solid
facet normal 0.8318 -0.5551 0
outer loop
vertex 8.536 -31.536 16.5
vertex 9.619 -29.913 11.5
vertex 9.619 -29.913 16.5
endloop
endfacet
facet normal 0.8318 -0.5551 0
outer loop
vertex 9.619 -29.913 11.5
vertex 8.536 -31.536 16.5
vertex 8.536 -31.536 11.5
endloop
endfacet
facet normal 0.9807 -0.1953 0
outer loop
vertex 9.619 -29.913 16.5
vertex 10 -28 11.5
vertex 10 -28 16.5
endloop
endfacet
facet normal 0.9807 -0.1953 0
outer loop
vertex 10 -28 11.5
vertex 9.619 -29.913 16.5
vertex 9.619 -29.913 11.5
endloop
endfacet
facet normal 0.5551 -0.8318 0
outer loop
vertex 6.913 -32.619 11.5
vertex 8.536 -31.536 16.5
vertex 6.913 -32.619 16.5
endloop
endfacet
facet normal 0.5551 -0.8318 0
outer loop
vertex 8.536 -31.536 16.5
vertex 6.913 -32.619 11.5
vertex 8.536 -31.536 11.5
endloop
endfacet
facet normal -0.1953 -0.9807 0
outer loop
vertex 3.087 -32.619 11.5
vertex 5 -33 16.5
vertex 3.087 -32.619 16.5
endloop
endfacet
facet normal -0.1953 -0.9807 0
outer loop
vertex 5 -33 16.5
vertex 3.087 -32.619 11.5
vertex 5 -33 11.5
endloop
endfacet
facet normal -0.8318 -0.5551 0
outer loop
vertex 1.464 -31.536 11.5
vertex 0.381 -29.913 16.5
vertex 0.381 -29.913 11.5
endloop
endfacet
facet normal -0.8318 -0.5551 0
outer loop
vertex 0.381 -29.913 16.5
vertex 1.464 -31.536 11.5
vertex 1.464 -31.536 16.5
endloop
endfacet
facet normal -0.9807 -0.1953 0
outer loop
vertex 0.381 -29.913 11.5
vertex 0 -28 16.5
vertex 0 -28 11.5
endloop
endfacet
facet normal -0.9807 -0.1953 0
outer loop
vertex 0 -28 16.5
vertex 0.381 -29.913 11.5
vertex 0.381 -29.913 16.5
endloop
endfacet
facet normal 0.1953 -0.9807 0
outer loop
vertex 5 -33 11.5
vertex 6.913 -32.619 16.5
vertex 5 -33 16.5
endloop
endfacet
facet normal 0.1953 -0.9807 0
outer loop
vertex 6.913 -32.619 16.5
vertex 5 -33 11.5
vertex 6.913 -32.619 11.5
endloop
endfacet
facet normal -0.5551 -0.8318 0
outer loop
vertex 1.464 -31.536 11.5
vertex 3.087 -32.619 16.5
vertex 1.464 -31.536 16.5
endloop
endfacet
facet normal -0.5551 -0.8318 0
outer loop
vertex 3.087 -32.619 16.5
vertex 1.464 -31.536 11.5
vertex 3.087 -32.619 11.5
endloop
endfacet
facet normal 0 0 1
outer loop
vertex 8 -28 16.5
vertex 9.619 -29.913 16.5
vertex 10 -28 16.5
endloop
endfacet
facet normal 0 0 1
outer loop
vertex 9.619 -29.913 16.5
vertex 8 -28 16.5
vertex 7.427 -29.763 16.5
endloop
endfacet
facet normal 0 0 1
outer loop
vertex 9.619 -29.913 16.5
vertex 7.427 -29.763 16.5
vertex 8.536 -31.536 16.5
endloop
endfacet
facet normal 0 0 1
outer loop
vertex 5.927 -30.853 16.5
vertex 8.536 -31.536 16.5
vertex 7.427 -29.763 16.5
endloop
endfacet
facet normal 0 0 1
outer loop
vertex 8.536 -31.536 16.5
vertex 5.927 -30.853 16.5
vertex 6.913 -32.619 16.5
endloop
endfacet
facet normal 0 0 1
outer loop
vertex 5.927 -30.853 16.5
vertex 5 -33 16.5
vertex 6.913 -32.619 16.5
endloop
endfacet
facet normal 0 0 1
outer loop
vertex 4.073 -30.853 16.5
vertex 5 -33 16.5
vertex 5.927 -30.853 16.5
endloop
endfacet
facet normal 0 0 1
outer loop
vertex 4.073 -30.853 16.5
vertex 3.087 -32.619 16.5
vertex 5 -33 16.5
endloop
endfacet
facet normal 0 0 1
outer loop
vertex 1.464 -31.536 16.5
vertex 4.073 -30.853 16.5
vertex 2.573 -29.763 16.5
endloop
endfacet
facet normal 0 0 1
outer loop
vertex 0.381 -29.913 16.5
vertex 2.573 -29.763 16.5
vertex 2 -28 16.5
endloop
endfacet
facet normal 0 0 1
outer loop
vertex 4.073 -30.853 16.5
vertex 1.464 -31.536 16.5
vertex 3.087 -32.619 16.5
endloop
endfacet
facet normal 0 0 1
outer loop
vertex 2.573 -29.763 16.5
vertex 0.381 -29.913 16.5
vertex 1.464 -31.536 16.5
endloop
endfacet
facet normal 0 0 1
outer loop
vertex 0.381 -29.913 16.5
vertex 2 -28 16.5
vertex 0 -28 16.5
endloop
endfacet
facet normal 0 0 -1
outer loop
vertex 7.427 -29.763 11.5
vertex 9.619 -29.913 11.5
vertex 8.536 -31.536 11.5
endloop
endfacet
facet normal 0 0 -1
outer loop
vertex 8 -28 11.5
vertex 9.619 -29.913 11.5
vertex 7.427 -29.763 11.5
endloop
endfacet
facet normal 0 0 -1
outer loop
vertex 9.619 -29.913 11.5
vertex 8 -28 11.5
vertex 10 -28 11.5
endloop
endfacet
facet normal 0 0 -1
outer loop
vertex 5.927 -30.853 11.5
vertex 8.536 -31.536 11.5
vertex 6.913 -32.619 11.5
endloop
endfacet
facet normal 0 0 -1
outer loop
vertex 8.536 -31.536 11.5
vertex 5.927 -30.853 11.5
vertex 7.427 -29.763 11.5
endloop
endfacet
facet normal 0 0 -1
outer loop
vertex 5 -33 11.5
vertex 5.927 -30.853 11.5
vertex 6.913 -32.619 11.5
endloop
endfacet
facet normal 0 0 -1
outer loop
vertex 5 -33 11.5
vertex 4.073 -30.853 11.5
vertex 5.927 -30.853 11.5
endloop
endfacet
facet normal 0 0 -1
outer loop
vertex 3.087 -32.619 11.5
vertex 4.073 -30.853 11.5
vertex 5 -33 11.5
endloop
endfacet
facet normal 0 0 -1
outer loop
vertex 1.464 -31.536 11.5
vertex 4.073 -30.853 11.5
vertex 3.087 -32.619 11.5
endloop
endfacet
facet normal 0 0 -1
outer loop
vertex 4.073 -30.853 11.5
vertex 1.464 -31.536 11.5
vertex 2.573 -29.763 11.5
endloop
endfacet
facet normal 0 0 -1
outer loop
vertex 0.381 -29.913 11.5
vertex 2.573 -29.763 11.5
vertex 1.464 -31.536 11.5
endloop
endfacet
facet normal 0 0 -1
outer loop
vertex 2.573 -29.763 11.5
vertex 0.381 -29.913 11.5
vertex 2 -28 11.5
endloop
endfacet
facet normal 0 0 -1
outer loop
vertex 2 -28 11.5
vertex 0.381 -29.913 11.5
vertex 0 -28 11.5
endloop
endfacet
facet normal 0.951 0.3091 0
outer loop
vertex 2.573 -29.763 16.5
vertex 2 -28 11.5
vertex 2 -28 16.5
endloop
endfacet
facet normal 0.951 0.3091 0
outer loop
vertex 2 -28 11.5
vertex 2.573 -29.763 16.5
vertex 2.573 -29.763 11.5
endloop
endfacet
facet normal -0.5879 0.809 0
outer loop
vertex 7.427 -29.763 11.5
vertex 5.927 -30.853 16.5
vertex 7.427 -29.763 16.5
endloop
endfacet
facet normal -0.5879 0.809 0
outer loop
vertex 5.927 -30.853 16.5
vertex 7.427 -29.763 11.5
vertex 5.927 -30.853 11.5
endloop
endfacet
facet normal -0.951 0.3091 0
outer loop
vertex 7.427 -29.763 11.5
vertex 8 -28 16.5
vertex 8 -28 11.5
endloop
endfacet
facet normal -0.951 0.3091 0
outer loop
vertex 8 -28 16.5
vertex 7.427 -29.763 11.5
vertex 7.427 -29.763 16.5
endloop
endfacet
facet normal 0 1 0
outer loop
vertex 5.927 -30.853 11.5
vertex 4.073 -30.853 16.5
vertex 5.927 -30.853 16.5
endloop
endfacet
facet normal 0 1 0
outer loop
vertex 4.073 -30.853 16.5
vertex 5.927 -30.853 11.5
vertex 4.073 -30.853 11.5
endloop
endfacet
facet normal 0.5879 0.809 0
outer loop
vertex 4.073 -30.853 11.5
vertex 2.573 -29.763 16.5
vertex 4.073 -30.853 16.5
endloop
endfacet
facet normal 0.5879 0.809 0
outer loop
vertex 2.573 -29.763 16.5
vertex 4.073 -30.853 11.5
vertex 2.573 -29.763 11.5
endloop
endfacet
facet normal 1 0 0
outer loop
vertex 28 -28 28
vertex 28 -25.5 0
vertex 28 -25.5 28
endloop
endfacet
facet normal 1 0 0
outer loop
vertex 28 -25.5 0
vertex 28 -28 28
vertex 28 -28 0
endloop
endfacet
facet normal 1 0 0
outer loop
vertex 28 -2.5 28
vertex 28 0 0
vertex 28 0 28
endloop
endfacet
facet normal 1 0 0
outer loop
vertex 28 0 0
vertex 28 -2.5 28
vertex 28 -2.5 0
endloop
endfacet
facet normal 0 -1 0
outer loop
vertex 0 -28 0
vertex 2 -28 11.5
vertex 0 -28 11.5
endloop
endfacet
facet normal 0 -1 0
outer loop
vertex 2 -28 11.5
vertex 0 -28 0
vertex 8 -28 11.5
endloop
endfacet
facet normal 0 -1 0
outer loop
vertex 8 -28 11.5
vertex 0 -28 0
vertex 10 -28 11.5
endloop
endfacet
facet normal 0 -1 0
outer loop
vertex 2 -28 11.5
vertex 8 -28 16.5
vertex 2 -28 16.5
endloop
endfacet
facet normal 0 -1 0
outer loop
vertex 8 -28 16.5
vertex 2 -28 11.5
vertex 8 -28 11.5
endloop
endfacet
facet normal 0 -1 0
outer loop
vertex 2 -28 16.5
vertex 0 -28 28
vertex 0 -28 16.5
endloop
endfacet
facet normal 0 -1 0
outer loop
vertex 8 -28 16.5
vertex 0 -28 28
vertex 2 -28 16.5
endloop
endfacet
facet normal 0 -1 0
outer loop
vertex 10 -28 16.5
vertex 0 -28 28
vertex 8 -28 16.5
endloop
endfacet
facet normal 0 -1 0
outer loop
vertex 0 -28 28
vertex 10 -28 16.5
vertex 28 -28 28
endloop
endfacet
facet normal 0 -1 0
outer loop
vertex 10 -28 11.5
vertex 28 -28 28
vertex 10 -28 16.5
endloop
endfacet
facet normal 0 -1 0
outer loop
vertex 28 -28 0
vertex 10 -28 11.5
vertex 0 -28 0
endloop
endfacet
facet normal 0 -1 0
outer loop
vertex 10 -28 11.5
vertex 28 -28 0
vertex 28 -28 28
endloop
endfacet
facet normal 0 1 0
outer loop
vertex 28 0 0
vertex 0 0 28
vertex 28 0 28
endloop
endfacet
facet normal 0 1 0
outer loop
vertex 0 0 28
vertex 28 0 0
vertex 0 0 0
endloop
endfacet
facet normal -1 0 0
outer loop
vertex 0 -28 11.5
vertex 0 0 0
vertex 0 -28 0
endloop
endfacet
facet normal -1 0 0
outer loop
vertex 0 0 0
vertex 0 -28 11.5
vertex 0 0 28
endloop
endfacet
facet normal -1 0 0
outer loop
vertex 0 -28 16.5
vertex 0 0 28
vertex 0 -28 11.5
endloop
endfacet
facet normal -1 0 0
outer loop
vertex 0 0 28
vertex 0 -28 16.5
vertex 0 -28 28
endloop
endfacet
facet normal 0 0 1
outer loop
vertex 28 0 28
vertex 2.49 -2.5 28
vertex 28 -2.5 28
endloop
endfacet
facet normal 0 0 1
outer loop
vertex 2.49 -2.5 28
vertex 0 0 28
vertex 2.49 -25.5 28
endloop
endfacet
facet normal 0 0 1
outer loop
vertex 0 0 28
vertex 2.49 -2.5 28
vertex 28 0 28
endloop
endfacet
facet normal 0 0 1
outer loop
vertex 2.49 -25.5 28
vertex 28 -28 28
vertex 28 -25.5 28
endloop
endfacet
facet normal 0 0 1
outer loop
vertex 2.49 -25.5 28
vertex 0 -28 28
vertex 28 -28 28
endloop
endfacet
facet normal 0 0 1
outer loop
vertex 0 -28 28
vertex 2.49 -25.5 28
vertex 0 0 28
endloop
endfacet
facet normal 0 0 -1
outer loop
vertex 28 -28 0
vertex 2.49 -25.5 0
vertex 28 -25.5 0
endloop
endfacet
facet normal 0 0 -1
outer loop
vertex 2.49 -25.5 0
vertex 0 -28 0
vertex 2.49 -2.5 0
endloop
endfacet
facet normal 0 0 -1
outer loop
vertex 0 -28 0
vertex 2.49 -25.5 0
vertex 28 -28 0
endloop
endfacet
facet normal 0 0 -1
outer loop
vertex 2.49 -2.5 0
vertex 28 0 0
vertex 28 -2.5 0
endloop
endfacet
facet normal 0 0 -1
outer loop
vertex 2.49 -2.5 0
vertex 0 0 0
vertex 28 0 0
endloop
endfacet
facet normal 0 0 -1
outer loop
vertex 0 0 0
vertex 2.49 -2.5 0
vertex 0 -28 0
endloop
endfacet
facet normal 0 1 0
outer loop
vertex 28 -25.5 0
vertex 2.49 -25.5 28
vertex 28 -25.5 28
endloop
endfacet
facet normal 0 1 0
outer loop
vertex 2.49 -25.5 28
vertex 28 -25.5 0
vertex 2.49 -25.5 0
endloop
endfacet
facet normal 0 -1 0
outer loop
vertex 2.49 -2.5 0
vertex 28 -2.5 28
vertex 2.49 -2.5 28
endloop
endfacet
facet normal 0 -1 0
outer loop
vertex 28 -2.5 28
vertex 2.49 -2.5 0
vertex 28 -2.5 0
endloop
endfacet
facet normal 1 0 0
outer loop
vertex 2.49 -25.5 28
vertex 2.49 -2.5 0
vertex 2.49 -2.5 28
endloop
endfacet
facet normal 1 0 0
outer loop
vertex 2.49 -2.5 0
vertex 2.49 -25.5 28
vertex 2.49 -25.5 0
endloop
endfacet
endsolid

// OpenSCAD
/* [Global] */
table_height = 23;
clipper_thickness = 5; 
hole_radius = 3;

/* [Hidden] */
printable = 1;
mo = 0.01;

rotate([printable?90:0,0,0])
clipper();

module clipper() {
	difference() {
		union(){
			cube(table_height + clipper_thickness);

			difference(){
				translate([hole_radius+2, (table_height + clipper_thickness*2  )/2, table_height + clipper_thickness])
				rotate([90,0,0])
					cylinder(h=clipper_thickness,r=hole_radius+2);

				translate([hole_radius+2, (table_height + clipper_thickness*2  )/2 +mo , table_height + clipper_thickness])
				rotate([90,0,0])
					cylinder(h=clipper_thickness+2*mo,r=hole_radius);
			}
		}


		translate([-mo+clipper_thickness/2,-mo,clipper_thickness/2])
			cube([table_height+clipper_thickness + 2*mo,table_height+clipper_thickness + 2*mo,table_height]);
	}
}
